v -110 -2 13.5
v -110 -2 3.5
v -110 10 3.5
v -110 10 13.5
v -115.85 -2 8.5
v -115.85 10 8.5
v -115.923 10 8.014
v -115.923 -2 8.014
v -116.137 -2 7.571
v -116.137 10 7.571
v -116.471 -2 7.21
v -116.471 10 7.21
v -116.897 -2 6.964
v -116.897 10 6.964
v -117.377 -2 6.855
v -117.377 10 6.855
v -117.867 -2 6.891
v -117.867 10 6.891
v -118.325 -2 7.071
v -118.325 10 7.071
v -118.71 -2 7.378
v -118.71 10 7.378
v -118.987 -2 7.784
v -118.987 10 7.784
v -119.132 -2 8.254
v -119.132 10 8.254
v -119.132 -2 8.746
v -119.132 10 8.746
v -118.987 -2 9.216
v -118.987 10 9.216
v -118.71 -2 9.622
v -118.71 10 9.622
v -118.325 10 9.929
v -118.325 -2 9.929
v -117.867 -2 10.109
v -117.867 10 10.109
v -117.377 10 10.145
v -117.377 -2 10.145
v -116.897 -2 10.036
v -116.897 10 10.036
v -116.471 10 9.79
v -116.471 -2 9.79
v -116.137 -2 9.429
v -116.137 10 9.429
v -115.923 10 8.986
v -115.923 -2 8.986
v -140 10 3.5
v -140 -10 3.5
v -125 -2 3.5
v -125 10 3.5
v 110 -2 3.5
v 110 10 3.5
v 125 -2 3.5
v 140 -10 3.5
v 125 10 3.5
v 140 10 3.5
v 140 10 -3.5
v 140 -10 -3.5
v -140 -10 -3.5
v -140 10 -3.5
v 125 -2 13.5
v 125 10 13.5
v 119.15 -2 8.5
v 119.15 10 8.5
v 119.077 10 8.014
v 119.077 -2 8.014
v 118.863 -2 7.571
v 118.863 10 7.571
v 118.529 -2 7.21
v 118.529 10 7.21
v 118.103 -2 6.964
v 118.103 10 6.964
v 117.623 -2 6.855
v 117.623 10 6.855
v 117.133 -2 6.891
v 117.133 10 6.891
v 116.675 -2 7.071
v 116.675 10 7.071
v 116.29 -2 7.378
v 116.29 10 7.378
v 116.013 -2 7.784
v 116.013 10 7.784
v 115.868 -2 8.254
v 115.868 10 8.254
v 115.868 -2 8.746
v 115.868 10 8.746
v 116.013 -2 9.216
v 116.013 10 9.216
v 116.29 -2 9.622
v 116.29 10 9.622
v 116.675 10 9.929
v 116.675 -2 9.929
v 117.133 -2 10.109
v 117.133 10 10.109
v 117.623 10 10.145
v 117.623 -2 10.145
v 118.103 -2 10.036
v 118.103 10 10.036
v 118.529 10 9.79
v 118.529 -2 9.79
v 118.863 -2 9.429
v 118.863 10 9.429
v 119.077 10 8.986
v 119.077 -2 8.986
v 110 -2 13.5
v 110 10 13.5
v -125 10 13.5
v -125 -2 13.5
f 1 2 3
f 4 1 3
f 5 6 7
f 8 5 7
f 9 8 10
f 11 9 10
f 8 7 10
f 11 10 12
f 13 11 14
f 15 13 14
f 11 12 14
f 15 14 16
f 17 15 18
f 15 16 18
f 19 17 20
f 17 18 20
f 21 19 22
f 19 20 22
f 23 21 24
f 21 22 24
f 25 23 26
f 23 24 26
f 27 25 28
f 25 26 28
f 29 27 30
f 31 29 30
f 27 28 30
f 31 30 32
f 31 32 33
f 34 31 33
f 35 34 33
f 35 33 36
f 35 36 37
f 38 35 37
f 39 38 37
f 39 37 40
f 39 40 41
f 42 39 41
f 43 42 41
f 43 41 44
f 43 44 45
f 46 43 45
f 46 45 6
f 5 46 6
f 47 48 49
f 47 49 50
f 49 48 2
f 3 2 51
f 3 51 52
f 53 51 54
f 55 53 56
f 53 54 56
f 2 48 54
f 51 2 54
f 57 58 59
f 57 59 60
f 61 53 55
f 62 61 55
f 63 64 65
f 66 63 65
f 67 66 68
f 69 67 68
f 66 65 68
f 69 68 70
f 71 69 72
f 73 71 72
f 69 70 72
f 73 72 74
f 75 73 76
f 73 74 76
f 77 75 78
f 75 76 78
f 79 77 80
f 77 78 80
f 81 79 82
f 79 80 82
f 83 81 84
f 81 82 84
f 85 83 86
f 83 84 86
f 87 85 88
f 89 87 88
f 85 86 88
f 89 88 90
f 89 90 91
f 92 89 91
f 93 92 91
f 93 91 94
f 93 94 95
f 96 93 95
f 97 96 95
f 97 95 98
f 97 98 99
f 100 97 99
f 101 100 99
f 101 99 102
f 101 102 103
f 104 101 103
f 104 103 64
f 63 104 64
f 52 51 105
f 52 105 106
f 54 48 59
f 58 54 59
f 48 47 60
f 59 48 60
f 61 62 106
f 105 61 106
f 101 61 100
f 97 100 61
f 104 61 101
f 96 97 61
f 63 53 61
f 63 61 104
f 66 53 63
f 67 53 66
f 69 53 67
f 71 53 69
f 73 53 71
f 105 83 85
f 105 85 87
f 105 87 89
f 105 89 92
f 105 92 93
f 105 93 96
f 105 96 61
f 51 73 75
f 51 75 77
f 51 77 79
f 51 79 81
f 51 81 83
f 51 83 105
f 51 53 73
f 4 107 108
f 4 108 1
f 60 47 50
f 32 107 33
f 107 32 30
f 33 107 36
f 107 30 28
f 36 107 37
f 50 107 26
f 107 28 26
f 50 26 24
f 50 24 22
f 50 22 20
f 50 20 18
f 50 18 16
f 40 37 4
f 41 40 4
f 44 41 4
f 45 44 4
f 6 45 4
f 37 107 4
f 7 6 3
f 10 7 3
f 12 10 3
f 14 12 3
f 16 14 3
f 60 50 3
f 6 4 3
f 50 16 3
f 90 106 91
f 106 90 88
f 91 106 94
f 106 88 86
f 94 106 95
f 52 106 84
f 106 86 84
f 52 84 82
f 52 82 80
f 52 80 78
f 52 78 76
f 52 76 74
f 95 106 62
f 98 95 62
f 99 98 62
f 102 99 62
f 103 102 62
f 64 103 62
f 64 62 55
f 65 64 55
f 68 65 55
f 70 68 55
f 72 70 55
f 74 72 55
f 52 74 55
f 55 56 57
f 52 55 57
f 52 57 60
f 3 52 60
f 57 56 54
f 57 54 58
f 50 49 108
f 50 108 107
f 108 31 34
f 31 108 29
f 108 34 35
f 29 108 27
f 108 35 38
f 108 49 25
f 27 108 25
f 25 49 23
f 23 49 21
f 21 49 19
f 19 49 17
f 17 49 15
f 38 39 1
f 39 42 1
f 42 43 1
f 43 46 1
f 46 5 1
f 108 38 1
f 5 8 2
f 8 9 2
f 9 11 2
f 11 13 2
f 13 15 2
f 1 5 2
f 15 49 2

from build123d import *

# Parameters (mm, degrees)
SKETCH_1_W         = 7
SKETCH_1_H         = 20
EXTRUDE_1_DEPTH    = 140
SKETCH_2_W         = 15
SKETCH_2_H         = 12
EXTRUDE_2_DEPTH    = 10
HOLE_WIZARD_M4_1_D = 3.3


with BuildPart() as part:
    # 草图1 → 凸台-拉伸1 (new, symmetric)
    with BuildSketch(Plane(origin=(0, 0, 0), x_dir=(0, 0, -1), z_dir=(1, 0, 0))):
        Rectangle(SKETCH_1_W, SKETCH_1_H)
    extrude(amount=EXTRUDE_1_DEPTH, both=True)

    # 草图2 → 凸台-拉伸2 (add)
    with BuildSketch(Plane.XY.offset(3.5)):
        with Locations((-117.5, 4)):
            Rectangle(SKETCH_2_W, SKETCH_2_H)
    extrude_2 = extrude(amount=EXTRUDE_2_DEPTH)

    # 镜向1: 凸台-拉伸2 across plane
    add(extrude_2.mirror(Plane(origin=(0, 0, 0), x_dir=(0, 0, 1), z_dir=(1, 0, 0))))

    # M4 螺纹孔1 (through all)
    with Locations(Plane(origin=(0, -2, 0), x_dir=(-1, 0, 0), z_dir=(0, -1, 0))):
        with Locations((-117.5, -8.5), (117.5, -8.5)):
            Hole(HOLE_WIZARD_M4_1_D / 2)


solid = part.part
